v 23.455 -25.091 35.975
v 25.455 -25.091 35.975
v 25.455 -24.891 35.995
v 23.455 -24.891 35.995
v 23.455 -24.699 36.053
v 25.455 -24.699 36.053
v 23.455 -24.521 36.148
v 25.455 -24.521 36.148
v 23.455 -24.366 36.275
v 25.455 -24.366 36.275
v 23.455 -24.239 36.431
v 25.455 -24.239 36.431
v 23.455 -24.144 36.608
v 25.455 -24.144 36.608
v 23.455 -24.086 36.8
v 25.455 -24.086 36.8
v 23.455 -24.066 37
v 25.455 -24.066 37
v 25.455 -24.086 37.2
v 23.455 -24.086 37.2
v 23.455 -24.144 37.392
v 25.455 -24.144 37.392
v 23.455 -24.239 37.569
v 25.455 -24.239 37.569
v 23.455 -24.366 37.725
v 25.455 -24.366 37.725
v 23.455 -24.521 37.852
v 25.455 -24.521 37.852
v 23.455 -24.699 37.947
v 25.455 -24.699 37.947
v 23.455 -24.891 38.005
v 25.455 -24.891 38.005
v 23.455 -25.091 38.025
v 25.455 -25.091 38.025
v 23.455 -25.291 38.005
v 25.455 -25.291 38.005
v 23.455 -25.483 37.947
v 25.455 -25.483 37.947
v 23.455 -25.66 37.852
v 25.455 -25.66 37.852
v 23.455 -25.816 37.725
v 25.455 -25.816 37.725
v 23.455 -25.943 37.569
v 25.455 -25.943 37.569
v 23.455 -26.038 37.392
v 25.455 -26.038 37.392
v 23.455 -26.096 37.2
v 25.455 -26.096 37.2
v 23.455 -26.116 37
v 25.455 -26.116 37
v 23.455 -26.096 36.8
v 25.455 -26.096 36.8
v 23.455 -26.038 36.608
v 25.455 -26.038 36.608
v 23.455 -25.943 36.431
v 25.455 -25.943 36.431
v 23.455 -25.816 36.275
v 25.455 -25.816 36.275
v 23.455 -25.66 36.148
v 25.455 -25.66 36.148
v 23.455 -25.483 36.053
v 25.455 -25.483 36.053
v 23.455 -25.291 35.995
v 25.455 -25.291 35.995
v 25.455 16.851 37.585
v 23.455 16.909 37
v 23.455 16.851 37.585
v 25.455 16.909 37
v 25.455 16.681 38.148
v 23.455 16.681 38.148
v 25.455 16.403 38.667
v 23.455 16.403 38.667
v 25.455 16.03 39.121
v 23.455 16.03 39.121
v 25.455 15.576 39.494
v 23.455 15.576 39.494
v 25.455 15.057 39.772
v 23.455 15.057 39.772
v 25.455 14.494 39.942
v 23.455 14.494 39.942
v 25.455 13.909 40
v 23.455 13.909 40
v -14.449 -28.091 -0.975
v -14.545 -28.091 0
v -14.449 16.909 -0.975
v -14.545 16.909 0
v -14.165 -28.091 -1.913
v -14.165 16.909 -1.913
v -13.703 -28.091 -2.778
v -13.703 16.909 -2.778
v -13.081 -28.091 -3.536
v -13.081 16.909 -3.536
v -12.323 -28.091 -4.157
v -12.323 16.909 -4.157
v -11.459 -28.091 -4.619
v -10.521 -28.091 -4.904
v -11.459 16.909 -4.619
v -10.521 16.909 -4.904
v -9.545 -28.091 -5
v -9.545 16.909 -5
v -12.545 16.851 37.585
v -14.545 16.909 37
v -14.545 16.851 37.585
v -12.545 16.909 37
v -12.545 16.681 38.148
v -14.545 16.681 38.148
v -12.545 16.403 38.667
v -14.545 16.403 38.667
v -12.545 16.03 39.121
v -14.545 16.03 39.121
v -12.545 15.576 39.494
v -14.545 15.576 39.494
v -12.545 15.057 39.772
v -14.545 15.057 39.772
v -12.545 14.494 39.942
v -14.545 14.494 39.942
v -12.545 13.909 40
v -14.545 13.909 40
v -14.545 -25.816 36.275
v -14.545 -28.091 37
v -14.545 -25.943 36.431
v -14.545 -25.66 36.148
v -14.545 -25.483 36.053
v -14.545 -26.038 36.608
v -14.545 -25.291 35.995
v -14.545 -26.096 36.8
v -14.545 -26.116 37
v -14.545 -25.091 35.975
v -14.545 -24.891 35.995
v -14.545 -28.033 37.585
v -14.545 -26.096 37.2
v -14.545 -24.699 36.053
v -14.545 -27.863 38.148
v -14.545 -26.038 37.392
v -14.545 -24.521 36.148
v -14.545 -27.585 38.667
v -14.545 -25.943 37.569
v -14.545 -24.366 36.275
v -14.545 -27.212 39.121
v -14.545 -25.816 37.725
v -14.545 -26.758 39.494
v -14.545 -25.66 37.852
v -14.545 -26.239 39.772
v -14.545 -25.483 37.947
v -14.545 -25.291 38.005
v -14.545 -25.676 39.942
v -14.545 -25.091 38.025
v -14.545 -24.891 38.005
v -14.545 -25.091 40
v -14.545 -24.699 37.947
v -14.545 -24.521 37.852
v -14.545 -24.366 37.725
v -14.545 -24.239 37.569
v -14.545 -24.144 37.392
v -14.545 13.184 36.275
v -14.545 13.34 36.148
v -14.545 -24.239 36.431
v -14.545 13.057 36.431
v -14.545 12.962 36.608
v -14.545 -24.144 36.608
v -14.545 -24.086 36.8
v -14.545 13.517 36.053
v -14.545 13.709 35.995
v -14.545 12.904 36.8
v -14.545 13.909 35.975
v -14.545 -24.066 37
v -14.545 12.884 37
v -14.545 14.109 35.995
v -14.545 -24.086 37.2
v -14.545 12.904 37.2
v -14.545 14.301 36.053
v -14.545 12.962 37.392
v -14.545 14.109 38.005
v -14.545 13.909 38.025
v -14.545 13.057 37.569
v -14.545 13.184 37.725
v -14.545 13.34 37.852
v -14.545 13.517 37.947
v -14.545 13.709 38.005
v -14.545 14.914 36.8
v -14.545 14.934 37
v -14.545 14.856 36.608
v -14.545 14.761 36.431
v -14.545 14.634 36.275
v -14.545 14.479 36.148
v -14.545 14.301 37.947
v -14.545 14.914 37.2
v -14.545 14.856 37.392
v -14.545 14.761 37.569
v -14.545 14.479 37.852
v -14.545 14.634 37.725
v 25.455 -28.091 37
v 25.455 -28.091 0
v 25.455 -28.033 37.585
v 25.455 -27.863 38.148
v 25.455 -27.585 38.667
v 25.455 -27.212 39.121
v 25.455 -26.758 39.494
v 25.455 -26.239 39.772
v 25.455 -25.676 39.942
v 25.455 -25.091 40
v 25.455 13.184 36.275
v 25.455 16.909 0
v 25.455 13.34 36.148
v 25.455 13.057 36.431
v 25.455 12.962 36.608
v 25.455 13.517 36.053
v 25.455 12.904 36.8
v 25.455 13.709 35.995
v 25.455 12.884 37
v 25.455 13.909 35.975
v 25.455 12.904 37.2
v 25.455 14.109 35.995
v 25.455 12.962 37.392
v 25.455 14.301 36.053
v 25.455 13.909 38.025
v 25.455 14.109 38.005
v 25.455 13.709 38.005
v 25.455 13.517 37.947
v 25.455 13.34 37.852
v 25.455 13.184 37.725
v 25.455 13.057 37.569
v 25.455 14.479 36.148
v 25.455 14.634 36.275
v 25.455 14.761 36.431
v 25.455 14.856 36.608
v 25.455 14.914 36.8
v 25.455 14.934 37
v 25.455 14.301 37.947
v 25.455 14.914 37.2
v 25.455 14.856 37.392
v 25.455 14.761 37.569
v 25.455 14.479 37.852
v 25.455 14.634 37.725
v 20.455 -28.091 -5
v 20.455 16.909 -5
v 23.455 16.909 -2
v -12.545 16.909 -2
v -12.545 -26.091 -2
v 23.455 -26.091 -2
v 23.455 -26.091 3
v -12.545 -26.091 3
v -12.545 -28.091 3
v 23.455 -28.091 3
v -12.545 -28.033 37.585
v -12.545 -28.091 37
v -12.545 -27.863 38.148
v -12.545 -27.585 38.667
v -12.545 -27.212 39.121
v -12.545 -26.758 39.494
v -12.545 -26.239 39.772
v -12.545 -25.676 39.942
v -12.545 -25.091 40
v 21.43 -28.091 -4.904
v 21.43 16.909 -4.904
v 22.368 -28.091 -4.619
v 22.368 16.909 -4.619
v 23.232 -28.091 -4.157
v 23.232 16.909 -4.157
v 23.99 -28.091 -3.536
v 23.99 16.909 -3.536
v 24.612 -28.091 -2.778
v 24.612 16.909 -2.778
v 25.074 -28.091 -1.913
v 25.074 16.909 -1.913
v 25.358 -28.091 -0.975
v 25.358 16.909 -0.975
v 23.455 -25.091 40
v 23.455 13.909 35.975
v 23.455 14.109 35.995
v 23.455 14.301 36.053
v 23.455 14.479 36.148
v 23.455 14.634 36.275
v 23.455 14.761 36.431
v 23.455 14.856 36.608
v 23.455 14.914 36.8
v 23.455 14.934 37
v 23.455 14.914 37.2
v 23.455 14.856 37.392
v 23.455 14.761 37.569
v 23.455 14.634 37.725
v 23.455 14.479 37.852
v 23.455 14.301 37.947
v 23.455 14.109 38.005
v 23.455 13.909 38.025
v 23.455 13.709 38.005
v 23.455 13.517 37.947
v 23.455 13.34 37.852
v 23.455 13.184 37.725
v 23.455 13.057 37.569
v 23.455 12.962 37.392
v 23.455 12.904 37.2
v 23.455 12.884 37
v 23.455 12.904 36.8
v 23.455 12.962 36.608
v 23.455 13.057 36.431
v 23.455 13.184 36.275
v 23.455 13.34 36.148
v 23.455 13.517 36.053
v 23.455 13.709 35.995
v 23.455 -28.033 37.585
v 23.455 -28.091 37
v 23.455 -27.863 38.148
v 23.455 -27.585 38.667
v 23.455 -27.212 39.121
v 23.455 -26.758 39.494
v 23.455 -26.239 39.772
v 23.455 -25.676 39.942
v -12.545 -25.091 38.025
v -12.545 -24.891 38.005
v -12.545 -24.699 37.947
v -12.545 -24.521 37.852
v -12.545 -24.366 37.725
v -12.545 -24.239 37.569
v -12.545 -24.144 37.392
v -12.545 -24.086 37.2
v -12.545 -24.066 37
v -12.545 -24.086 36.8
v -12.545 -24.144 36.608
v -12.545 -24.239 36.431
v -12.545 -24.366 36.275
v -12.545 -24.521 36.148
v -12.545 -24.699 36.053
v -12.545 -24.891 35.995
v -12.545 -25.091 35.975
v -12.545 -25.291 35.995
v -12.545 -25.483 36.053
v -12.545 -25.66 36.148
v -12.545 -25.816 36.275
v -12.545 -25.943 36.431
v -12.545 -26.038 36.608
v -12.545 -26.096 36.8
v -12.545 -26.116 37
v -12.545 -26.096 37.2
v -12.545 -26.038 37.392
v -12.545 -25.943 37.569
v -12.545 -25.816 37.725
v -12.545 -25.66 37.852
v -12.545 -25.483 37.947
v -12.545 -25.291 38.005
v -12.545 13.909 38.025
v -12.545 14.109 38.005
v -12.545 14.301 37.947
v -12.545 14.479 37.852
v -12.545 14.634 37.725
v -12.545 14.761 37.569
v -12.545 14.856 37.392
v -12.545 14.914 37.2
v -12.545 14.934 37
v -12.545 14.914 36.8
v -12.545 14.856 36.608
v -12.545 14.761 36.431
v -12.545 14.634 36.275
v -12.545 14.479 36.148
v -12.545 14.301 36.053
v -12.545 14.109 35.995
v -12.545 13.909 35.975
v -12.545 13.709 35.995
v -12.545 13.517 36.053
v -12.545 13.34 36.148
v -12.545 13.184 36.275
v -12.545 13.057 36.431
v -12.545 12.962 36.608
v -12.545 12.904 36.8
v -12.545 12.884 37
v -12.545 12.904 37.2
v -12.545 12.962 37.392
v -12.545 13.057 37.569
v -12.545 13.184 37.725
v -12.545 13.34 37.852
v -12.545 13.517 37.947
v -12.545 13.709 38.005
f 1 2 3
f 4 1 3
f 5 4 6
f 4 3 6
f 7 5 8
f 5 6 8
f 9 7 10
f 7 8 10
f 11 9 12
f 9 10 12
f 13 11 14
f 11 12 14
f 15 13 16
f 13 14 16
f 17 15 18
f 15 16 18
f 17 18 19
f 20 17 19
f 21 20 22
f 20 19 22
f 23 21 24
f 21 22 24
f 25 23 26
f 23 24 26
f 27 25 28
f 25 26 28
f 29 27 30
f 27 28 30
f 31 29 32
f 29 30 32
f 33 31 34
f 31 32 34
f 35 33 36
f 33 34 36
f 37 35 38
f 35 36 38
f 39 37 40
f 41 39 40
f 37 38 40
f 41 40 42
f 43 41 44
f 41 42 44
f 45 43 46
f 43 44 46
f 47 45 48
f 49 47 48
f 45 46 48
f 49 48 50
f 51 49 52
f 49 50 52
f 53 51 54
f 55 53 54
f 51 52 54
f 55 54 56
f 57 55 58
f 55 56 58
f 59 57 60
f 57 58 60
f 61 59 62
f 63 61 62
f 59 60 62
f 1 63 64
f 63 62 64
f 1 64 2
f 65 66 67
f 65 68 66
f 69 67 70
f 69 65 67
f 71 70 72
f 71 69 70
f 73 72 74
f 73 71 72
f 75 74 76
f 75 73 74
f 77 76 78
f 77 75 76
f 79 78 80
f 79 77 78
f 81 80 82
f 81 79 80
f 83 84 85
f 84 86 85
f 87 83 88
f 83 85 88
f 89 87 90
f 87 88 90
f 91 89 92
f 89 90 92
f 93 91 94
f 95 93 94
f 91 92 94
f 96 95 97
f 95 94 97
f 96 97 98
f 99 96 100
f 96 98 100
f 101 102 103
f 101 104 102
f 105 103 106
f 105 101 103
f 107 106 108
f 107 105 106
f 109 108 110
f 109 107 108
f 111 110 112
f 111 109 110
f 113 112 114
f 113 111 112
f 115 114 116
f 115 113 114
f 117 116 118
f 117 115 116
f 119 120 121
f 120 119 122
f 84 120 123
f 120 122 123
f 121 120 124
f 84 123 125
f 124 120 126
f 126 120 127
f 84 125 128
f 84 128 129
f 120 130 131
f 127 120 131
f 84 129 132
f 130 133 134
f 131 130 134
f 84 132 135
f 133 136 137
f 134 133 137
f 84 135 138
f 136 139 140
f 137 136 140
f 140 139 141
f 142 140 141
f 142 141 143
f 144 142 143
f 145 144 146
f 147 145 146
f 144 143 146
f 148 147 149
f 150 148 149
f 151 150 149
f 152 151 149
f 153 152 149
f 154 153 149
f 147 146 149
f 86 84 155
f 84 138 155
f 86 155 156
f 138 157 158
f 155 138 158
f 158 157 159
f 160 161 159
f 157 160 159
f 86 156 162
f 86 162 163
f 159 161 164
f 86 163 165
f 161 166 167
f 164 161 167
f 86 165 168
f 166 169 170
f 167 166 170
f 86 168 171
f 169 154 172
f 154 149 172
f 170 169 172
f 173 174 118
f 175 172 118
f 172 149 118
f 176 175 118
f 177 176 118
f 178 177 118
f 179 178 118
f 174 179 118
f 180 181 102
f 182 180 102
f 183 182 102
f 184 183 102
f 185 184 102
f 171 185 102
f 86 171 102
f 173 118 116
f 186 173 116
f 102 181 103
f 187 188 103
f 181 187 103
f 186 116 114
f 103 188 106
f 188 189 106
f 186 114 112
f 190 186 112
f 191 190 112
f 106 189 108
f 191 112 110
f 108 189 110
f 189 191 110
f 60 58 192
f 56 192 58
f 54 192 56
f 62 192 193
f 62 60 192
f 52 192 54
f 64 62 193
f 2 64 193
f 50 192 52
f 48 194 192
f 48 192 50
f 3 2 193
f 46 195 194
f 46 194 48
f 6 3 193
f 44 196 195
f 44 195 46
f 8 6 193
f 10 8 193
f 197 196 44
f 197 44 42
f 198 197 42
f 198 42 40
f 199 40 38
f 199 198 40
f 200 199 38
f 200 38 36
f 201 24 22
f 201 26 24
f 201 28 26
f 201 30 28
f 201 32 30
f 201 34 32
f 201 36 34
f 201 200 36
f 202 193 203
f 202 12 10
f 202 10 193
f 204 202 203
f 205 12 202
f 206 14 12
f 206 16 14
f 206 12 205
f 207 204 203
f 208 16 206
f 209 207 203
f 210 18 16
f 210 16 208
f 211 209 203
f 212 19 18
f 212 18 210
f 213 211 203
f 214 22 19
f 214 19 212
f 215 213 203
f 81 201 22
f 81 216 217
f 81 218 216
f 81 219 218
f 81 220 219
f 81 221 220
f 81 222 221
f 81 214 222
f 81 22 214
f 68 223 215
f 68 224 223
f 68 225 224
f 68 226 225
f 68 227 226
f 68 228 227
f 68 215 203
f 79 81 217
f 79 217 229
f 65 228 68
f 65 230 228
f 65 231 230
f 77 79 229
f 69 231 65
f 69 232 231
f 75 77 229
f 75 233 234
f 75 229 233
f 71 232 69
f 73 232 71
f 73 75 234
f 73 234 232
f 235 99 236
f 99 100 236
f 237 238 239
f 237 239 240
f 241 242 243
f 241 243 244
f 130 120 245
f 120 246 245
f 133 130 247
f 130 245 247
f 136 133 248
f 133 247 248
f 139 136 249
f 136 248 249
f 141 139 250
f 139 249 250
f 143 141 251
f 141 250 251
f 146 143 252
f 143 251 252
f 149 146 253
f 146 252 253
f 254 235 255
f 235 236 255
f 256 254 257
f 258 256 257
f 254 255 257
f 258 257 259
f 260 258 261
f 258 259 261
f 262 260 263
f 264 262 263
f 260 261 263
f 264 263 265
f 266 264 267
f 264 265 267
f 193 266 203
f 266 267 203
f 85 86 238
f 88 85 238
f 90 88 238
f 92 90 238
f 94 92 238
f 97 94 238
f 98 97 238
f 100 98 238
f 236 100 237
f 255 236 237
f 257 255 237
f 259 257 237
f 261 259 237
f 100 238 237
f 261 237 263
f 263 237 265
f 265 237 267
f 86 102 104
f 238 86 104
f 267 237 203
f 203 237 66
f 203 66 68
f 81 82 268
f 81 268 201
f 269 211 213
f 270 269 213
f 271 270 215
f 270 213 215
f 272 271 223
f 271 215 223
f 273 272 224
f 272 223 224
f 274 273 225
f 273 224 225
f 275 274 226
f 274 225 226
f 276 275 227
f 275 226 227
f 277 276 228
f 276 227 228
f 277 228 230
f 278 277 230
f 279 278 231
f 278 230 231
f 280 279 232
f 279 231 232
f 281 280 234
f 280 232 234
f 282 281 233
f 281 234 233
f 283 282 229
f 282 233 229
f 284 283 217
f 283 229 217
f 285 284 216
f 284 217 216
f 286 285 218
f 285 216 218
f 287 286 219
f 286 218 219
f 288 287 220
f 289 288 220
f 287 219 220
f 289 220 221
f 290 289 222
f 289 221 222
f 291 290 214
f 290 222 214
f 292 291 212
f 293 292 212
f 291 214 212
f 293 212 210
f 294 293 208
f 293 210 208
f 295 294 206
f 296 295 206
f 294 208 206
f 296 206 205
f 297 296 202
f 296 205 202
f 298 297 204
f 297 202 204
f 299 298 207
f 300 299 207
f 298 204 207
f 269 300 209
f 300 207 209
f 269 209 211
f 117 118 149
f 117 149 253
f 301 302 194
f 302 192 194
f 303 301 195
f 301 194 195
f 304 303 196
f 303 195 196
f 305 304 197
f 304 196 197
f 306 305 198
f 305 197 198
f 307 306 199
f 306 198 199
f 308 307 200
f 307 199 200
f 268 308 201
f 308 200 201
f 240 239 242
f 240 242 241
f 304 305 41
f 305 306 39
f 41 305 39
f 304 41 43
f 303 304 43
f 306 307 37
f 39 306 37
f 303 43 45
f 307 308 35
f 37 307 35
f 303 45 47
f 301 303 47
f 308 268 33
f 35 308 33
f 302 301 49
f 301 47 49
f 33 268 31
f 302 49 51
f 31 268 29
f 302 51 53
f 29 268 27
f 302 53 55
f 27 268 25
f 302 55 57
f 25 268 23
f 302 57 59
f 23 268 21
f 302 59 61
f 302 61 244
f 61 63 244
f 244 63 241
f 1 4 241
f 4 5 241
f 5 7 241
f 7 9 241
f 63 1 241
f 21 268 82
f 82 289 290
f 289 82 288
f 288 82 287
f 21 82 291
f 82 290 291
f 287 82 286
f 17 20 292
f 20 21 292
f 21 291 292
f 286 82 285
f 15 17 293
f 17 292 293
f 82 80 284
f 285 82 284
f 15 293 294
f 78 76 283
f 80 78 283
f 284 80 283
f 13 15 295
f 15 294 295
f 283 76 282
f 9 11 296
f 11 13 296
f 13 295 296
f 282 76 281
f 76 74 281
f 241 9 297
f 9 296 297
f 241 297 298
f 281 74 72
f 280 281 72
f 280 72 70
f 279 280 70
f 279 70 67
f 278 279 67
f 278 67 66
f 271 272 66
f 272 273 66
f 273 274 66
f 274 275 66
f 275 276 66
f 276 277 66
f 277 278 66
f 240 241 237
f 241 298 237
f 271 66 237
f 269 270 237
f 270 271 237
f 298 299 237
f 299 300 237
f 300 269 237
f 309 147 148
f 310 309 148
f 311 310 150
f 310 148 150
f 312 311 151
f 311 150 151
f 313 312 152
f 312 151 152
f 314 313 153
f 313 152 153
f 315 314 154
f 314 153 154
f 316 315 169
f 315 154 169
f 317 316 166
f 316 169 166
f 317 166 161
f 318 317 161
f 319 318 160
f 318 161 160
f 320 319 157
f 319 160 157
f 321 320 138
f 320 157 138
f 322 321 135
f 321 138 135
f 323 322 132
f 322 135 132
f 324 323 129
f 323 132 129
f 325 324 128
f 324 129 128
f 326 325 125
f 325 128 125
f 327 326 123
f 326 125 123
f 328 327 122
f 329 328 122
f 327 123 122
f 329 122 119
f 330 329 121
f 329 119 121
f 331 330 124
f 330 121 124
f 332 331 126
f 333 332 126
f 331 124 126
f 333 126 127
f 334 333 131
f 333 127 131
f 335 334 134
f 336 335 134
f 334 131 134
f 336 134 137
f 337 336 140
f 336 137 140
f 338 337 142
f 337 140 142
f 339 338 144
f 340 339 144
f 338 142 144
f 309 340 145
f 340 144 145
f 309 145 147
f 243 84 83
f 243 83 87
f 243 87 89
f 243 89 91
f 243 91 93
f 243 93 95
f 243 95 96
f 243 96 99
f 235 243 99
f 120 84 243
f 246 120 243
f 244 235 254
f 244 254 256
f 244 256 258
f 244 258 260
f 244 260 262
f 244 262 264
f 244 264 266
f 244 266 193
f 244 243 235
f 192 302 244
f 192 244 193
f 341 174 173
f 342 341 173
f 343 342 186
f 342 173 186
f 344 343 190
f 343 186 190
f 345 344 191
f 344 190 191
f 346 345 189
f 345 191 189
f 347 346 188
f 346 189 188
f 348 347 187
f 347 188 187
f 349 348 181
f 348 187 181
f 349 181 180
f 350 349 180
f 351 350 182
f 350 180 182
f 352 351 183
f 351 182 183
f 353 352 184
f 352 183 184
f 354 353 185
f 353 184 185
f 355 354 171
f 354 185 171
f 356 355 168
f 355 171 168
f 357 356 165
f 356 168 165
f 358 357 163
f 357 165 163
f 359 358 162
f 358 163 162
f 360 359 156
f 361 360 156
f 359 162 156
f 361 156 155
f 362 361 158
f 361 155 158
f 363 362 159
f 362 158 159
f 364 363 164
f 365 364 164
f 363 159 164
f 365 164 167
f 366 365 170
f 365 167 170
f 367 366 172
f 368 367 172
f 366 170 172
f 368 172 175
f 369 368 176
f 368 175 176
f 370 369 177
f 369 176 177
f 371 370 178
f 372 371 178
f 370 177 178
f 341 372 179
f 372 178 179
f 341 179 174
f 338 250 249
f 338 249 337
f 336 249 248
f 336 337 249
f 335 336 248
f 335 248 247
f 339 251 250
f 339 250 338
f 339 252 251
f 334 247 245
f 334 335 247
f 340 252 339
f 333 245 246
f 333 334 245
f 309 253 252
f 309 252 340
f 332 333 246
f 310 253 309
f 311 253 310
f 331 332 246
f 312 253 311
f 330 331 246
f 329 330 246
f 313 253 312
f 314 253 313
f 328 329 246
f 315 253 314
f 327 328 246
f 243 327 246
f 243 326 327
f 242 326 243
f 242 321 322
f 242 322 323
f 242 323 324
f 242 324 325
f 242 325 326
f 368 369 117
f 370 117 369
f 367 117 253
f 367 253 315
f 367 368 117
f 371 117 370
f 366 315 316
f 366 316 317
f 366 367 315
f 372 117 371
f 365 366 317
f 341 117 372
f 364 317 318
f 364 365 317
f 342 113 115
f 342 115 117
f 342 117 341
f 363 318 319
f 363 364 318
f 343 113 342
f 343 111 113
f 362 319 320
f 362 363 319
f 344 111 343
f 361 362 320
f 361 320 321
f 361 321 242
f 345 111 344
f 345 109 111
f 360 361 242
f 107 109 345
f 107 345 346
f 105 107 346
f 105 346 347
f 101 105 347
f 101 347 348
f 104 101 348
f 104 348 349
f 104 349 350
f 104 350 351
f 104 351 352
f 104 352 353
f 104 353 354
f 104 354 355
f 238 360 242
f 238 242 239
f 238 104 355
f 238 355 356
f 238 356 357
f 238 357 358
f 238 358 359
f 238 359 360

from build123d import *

# Parameters (mm, degrees)
SKETCH_1_W           = 40
SKETCH_1_H           = 45
EXTRUDE_1_DEPTH      = 40
EXTRUDE_1_DEPTH_BACK = 5
SKETCH_2_W           = 36
SKETCH_2_H           = 37
CUT_EXTRUDE_1_DEPTH  = 50
SKETCH_3_R           = 1.025
CUT_EXTRUDE_2_DEPTH  = 2
SKETCH_4_R           = 1.025
CUT_EXTRUDE_3_DEPTH  = 2
SKETCH_5_W           = 36
SKETCH_5_H           = 5
CUT_EXTRUDE_4_DEPTH  = 43
FILLET_6_R           = 5
FILLET_7_R           = 5
FILLET_12_R          = 3
FILLET_13_R          = 3
FILLET_14_R          = 3
FILLET_15_R          = 3


with BuildPart() as part:
    # 草圖1 → 填料-伸長1 (new body, two sides)
    with BuildSketch(Plane.XY) as extrude_1_sk:
        with Locations((5.454545455, -5.590909091)):
            Rectangle(SKETCH_1_W, SKETCH_1_H)
    extrude(amount=EXTRUDE_1_DEPTH)
    extrude(extrude_1_sk.sketch, amount=-EXTRUDE_1_DEPTH_BACK)

    # 草圖2 → 除料-伸長1 (cut)
    with BuildSketch(Plane(origin=(0, 16.909090909, 0), x_dir=(1, 0, 0), z_dir=(0, 1, 0))):
        with Locations((5.454545455, -21.5)):
            Rectangle(SKETCH_2_W, SKETCH_2_H)
    extrude(amount=-CUT_EXTRUDE_1_DEPTH, mode=Mode.SUBTRACT)

    # 草圖3 → 除料-伸長2 (cut)
    with BuildSketch(Plane.ZY.offset(14.545454545)):
        with Locations((37, -25.090909091)):
            Circle(SKETCH_3_R)
        with Locations((37, 13.909090909)):
            Circle(SKETCH_3_R)
    extrude(amount=-CUT_EXTRUDE_2_DEPTH, mode=Mode.SUBTRACT)

    # 草圖4 → 除料-伸長3 (cut)
    with BuildSketch(Plane(origin=(25.454545455, 0, 0), x_dir=(0, 0, -1), z_dir=(1, 0, 0))):
        with Locations((-37, 13.909090909)):
            Circle(SKETCH_4_R)
        with Locations((-37, -25.090909091)):
            Circle(SKETCH_4_R)
    extrude(amount=-CUT_EXTRUDE_3_DEPTH, mode=Mode.SUBTRACT)

    # 草圖5 → 除料-伸長4 (cut)
    with BuildSketch(Plane(origin=(0, 16.909090909, 0), x_dir=(1, 0, 0), z_dir=(0, 1, 0))):
        with Locations((5.454545455, -0.5)):
            Rectangle(SKETCH_5_W, SKETCH_5_H)
    extrude(amount=-CUT_EXTRUDE_4_DEPTH, mode=Mode.SUBTRACT)

    # 圓角6
    fillet_6_edges = [part.edges().sort_by_distance(p)[0] for p in [
        (-14.545454545, -5.590909091, -5),
    ]]
    fillet(fillet_6_edges, radius=FILLET_6_R)

    # 圓角7
    fillet_7_edges = [part.edges().sort_by_distance(p)[0] for p in [
        (25.454545455, -5.590909091, -5),
    ]]
    fillet(fillet_7_edges, radius=FILLET_7_R)

    # 圓角12
    fillet_12_edges = [part.edges().sort_by_distance(p)[0] for p in [
        (-13.545454545, -28.090909091, 40),
    ]]
    fillet(fillet_12_edges, radius=FILLET_12_R)

    # 圓角13
    fillet_13_edges = [part.edges().sort_by_distance(p)[0] for p in [
        (24.454545455, -28.090909091, 40),
    ]]
    fillet(fillet_13_edges, radius=FILLET_13_R)

    # 圓角14
    fillet_14_edges = [part.edges().sort_by_distance(p)[0] for p in [
        (-13.545454545, 16.909090909, 40),
    ]]
    fillet(fillet_14_edges, radius=FILLET_14_R)

    # 圓角15
    fillet_15_edges = [part.edges().sort_by_distance(p)[0] for p in [
        (24.454545455, 16.909090909, 40),
    ]]
    fillet(fillet_15_edges, radius=FILLET_15_R)


solid = part.part
